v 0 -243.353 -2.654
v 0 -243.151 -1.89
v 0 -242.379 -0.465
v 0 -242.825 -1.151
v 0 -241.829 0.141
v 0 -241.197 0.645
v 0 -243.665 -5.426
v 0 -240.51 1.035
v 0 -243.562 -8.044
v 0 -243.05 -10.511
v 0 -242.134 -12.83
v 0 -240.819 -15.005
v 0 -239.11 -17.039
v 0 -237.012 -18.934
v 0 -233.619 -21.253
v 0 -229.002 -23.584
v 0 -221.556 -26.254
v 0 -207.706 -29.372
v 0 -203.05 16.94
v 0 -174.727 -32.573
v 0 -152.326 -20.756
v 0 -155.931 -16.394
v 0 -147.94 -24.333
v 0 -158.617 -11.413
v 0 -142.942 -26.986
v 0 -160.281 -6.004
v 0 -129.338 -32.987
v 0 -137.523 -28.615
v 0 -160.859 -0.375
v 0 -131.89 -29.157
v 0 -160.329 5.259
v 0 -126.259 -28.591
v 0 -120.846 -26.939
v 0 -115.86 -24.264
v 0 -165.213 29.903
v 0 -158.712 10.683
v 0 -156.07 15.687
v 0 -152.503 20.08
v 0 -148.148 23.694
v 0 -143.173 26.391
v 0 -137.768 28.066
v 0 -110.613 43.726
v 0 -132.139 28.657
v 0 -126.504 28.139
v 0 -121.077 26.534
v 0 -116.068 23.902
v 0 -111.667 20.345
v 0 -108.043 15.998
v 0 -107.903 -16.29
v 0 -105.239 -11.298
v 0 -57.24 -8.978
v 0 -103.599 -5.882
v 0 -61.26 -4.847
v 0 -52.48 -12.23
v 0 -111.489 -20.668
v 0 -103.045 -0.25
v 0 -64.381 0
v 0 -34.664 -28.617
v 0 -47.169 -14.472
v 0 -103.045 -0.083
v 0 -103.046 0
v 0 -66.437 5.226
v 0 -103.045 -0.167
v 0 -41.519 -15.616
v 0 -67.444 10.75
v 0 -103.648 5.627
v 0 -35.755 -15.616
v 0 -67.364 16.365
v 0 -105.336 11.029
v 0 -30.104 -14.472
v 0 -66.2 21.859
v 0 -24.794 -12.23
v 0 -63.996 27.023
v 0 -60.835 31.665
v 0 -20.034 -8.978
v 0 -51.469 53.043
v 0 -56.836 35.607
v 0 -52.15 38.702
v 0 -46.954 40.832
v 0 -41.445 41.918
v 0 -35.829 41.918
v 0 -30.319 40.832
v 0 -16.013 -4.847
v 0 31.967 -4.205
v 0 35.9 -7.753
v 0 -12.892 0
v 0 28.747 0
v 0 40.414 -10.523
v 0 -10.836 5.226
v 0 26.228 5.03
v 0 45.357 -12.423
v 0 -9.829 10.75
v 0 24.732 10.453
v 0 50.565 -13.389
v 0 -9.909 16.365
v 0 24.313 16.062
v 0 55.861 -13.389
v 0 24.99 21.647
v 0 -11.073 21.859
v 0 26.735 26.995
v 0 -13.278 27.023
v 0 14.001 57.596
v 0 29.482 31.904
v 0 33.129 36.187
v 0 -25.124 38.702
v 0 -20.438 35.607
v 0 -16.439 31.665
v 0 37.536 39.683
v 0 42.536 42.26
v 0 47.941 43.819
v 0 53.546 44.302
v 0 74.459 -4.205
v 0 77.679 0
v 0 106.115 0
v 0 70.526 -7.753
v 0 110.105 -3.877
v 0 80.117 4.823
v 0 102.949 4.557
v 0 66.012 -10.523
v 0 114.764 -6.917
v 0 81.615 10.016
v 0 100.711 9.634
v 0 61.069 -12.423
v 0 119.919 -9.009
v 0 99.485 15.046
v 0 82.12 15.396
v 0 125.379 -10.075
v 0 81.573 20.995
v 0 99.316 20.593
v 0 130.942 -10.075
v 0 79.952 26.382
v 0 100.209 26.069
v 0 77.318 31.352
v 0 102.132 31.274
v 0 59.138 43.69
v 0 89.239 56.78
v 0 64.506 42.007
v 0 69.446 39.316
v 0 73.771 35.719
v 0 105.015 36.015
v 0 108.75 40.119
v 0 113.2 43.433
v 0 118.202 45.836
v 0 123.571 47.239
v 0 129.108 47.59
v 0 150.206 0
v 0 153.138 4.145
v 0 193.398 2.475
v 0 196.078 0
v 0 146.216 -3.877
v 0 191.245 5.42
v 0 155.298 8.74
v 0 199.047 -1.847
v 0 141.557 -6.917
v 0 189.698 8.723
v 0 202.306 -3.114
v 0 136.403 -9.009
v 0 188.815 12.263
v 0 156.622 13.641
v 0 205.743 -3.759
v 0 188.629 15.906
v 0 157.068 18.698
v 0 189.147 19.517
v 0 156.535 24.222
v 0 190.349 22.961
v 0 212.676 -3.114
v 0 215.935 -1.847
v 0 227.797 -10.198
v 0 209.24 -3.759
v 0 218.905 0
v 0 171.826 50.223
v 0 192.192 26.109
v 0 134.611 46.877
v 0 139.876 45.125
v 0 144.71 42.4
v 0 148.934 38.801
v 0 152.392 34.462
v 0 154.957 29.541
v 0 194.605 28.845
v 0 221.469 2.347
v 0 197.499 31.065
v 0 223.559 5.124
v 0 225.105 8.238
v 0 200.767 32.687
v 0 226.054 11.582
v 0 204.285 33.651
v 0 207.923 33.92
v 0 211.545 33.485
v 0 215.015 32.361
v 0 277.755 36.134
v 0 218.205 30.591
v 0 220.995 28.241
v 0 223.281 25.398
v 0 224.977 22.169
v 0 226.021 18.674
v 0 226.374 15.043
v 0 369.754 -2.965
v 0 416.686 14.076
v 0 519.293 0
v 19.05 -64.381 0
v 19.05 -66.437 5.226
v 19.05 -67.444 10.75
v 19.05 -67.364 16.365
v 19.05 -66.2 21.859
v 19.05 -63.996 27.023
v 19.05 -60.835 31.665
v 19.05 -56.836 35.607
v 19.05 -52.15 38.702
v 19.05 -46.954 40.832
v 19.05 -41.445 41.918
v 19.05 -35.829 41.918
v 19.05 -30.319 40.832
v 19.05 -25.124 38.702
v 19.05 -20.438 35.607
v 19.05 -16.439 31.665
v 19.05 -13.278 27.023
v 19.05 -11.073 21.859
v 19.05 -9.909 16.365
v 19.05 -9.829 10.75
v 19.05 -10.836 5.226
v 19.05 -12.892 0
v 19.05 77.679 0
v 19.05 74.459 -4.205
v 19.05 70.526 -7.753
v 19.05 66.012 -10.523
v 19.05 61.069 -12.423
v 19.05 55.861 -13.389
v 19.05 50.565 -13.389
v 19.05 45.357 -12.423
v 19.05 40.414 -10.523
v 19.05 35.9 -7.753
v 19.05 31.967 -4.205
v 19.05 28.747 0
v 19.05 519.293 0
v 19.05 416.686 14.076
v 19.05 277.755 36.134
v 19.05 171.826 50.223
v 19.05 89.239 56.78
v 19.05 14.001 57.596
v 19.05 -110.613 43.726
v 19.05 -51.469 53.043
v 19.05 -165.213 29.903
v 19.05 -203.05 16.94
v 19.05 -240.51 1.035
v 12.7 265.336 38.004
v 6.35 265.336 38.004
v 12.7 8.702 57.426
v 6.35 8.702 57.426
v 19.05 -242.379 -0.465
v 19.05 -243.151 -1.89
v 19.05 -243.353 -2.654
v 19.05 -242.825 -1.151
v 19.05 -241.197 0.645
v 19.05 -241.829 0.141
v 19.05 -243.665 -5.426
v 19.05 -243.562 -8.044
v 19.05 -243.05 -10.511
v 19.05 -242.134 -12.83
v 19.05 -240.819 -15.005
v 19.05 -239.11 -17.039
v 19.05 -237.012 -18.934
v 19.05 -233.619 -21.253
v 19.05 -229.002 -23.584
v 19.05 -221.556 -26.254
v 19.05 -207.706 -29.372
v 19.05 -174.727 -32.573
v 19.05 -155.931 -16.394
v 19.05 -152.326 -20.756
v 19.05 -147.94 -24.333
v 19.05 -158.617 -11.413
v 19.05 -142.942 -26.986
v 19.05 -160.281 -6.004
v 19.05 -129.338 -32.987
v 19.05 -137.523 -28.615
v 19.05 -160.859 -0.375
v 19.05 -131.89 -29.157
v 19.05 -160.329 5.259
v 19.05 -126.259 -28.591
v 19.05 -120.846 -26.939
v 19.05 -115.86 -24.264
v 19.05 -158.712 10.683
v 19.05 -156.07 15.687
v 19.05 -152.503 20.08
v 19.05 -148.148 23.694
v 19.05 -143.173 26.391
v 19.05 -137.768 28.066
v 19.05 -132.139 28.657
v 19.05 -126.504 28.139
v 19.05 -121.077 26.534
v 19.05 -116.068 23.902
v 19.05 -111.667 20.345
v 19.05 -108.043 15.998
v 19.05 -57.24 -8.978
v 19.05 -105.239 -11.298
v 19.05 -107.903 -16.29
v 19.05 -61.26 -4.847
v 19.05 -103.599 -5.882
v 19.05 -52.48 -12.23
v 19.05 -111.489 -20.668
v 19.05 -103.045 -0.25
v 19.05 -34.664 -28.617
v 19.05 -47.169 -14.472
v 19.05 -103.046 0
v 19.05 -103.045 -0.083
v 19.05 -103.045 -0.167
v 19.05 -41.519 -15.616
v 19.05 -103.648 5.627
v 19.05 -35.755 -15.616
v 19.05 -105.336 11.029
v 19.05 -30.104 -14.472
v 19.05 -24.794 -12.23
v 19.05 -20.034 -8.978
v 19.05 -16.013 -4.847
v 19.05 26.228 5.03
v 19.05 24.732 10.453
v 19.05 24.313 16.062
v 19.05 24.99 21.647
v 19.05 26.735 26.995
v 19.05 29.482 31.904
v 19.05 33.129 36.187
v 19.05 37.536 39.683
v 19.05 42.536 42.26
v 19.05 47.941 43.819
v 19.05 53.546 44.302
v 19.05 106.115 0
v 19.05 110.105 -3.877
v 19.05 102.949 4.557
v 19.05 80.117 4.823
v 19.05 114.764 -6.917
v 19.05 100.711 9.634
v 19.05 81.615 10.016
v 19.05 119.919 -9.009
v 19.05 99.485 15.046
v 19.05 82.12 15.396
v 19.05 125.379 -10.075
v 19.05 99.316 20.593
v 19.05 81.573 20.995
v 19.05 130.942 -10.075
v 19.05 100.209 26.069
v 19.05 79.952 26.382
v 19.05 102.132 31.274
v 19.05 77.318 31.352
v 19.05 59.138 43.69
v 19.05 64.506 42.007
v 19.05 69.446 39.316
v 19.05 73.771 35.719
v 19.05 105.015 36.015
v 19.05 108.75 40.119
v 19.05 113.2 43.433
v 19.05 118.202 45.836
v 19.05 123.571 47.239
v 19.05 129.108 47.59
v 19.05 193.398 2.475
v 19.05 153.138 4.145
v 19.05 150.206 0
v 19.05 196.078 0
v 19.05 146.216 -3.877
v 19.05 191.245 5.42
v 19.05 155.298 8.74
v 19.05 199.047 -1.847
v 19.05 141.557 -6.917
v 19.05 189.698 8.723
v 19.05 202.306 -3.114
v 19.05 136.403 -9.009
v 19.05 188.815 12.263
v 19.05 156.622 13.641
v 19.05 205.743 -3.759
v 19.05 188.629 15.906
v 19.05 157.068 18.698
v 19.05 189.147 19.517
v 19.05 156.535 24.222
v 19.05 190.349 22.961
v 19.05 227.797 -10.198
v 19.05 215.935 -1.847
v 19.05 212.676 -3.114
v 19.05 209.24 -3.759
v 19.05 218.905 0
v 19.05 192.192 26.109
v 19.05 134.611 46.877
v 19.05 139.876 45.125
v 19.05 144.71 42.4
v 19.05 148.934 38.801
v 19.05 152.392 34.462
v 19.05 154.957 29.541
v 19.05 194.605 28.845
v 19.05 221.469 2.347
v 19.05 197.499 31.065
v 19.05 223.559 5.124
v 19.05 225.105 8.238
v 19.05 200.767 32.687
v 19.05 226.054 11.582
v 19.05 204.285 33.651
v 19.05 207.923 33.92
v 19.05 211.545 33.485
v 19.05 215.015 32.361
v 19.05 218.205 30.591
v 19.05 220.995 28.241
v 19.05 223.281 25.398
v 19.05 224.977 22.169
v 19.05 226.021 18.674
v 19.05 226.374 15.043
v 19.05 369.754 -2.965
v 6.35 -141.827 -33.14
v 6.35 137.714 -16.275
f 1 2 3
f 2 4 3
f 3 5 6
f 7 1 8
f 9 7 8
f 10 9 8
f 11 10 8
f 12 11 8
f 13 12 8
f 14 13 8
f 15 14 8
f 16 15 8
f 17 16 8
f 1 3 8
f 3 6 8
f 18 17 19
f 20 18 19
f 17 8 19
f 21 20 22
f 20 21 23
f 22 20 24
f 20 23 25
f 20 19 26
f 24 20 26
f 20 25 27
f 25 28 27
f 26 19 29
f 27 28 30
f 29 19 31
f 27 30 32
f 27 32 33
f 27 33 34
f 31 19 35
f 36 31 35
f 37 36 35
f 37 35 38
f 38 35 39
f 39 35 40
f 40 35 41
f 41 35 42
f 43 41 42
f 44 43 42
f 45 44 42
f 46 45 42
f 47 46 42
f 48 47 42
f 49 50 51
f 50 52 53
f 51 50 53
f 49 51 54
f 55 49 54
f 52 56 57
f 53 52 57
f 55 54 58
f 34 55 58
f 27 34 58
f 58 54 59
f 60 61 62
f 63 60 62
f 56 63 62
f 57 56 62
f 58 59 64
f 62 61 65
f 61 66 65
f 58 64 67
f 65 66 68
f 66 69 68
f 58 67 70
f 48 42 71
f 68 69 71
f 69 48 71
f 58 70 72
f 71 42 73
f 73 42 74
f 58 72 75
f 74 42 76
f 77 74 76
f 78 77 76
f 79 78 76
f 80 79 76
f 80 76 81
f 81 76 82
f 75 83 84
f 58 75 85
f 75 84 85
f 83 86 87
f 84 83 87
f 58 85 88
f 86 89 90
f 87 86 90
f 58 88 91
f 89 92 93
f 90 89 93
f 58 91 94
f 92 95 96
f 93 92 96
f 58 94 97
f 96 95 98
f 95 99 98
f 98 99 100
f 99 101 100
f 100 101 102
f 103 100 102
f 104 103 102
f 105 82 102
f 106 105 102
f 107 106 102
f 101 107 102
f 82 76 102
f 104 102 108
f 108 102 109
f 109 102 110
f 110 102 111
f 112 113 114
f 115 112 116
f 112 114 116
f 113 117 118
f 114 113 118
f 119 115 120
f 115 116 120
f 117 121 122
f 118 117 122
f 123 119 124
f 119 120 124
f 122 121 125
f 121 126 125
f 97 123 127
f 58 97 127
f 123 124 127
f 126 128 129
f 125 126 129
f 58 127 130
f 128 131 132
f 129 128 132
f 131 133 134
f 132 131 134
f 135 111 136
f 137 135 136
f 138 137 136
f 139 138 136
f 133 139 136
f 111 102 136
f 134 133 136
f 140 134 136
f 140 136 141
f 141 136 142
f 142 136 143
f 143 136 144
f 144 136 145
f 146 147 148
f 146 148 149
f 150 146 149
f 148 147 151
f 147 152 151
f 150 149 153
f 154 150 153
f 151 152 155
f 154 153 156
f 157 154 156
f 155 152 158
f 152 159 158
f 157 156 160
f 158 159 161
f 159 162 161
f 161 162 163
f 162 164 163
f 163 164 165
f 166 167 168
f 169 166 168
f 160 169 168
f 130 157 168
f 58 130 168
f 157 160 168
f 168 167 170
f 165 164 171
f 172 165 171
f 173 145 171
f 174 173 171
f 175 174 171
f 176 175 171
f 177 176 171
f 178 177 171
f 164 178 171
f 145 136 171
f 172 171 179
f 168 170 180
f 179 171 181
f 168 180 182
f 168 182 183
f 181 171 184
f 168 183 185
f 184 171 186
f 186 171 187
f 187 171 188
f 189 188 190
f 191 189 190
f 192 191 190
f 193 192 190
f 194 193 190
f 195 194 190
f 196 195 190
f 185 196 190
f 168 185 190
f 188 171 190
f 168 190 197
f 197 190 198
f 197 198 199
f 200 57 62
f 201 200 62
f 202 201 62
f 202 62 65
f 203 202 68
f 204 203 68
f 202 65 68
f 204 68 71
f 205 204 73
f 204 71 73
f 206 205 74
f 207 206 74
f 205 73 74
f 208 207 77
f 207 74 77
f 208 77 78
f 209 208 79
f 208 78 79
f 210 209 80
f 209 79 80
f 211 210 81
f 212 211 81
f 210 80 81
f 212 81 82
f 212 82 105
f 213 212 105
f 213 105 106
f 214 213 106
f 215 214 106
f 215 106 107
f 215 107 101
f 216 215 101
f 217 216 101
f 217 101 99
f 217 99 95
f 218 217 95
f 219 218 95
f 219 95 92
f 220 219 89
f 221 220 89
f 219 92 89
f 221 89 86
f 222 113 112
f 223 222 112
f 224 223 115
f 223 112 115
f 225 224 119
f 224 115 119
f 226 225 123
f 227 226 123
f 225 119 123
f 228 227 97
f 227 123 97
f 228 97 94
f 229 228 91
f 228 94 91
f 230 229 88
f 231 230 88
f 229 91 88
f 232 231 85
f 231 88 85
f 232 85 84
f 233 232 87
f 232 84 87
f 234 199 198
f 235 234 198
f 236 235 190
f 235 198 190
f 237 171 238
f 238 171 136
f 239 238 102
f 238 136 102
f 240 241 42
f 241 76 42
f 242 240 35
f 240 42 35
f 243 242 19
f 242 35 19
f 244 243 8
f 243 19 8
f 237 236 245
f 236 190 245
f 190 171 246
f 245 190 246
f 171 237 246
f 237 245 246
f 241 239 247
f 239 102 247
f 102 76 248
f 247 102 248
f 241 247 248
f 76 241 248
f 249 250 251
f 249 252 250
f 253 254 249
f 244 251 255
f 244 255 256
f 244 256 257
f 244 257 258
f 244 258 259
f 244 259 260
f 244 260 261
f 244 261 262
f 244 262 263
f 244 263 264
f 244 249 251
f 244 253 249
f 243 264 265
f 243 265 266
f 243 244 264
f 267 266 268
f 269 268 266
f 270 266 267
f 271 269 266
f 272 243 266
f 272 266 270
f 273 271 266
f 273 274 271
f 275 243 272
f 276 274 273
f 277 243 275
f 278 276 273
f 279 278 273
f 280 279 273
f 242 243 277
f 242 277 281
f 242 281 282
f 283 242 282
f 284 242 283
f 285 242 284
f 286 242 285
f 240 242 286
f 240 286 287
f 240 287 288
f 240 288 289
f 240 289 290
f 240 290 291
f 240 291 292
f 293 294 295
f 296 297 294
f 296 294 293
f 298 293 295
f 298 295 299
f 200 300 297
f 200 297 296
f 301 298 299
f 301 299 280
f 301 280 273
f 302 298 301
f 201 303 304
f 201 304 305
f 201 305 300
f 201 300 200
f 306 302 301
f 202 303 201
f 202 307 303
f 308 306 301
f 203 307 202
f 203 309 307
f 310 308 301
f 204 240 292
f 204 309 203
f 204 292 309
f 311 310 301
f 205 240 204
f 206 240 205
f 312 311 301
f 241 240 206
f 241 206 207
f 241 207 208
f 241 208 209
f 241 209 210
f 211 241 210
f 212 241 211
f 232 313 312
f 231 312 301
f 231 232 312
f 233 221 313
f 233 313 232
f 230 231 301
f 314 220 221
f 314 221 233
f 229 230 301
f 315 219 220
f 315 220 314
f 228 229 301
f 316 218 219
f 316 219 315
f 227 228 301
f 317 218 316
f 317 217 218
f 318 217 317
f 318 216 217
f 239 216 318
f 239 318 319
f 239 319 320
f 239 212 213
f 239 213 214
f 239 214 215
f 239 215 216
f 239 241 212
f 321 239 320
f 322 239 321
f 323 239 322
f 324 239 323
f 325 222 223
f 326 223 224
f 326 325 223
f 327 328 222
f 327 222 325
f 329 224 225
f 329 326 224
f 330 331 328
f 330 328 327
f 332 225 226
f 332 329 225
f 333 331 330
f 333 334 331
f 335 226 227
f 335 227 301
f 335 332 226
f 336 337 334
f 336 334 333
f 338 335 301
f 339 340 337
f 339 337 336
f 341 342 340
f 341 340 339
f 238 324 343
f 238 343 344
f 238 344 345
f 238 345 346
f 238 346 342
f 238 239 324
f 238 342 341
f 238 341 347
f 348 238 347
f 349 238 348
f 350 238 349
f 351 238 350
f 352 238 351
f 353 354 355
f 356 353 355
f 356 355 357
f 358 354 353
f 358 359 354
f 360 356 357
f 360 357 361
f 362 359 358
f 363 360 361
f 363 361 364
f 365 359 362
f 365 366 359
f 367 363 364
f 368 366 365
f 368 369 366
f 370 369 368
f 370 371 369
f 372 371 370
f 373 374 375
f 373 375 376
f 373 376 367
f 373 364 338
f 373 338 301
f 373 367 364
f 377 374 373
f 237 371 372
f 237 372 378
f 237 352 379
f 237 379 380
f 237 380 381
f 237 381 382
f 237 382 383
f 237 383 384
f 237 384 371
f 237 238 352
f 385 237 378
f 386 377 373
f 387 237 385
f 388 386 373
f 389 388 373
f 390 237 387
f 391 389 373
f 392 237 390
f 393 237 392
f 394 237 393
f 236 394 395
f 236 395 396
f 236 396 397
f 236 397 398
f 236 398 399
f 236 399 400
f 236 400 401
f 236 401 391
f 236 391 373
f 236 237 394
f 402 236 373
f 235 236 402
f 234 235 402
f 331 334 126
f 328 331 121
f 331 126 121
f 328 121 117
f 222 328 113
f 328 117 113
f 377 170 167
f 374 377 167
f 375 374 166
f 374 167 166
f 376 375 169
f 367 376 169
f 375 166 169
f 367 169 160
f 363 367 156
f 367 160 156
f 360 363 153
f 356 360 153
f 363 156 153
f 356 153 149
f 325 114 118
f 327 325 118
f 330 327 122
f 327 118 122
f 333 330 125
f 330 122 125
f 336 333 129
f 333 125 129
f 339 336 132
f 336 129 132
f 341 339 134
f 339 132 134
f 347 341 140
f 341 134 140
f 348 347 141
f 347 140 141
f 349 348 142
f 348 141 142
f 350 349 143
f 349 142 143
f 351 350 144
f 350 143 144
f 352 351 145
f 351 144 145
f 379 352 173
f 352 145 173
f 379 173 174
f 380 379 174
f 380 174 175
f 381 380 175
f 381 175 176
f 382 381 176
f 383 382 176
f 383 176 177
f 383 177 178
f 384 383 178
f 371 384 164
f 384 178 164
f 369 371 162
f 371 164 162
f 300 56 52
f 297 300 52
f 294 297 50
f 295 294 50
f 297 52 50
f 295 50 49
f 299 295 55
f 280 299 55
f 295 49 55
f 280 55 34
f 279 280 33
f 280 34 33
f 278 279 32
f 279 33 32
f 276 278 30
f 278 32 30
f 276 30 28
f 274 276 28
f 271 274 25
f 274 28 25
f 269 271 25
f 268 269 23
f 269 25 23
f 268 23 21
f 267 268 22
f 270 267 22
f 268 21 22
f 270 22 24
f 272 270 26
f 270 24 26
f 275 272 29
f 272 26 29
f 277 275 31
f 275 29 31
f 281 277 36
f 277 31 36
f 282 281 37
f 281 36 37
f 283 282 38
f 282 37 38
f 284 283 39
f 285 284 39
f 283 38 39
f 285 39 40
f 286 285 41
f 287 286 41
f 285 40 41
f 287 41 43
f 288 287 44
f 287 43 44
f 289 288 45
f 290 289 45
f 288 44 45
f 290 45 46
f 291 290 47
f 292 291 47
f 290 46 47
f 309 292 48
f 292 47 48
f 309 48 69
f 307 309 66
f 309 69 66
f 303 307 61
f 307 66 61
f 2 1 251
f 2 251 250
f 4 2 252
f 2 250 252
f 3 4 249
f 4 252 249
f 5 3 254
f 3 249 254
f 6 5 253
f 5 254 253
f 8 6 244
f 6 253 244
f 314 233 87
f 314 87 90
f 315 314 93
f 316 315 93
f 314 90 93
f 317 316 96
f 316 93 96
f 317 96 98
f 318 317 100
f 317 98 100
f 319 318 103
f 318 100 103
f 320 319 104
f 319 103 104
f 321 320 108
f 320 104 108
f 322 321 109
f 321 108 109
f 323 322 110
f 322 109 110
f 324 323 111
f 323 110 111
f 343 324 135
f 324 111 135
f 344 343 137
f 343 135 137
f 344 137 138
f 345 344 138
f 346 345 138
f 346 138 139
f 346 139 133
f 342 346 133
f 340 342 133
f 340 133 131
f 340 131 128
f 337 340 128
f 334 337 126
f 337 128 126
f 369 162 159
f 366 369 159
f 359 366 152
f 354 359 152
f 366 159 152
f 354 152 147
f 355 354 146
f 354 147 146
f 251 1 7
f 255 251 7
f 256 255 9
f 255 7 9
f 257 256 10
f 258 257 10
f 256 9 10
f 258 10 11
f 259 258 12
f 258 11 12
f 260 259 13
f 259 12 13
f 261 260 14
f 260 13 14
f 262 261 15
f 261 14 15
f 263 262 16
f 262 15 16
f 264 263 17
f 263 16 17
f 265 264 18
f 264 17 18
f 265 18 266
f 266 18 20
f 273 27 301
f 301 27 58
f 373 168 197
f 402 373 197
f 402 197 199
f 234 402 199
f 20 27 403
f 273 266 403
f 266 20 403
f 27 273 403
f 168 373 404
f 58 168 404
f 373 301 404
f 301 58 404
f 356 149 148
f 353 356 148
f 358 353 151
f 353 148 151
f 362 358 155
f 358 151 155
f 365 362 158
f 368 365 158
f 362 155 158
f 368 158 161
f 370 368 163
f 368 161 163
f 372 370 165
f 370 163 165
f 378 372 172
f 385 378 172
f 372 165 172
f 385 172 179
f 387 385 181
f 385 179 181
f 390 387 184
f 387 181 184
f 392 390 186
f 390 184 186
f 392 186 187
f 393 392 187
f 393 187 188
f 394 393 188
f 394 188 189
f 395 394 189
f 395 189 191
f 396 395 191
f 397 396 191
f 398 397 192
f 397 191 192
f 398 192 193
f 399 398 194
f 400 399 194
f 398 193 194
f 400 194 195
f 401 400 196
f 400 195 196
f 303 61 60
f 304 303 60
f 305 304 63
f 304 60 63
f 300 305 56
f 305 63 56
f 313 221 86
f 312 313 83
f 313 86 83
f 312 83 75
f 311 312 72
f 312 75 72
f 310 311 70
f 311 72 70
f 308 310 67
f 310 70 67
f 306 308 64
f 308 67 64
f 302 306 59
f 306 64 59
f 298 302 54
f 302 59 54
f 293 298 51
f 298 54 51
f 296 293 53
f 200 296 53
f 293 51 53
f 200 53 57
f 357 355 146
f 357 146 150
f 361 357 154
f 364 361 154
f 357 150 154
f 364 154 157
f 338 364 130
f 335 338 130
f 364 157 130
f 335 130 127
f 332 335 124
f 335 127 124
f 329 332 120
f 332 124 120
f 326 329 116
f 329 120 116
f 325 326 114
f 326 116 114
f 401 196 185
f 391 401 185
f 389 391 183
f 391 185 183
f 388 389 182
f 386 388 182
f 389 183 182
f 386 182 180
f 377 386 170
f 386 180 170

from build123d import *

# Parameters (mm, degrees)
F1_DEPTH = 19.05
F2_R     = 5.08


with BuildPart() as f1:
    # F0 (on Right) → F1 (new body)
    with BuildSketch(Plane.YZ):
        with BuildLine():
            Line((-160.8581324715, 0), (-242.7069797365, 0))
            add(Edge.make_bspline(
                [(-242.7069797365, 0), (-265.2118802071, -74.5986700058), (107.0116907358, 0), (519.2930202635, 0)],
                knots=[0, 0, 0, 0, 762, 762, 762, 762], degree=3))
            Line((519.2930202635, 0), (218.9046558231, 0))
            ThreePointArc((218.9046558231, 0), (207.4913084507, -3.8397523781), (196.0779610783, 0))
            Line((196.0779610783, 0), (150.206251788, 0))
            ThreePointArc((150.206251788, 0), (128.160789609, -10.2089434816), (106.1153274299, 0))
            Line((106.1153274299, 0), (77.678939592, 0))
            ThreePointArc((77.678939592, 0), (53.2129891217, -13.5109411506), (28.7470386513, 0))
            Line((28.7470386513, 0), (-12.8924874617, 0))
            ThreePointArc((-12.8924874617, 0), (-38.6368222535, -15.7596921502), (-64.3811570453, 0))
            Line((-64.3811570453, 0), (-103.0457951603, 0))
            ThreePointArc((-103.0457951603, 0), (-103.0449853734, -0.1249209702), (-103.0447154427, -0.2498442734))
            ThreePointArc((-103.0447154427, -0.2498442734), (-132.0768871191, -29.1568227159), (-160.8581324715, 0))
        make_face()
        with BuildLine():
            add(Edge.make_bspline(
                [(519.2930202635, 0), (269.2858278751, 28.3039230853), (0, 114.9312928319), (-242.7069797365, 0)],
                knots=[0, 0, 0, 0, 762, 762, 762, 762], degree=3))
            Line((-242.7069797365, 0), (-160.8581324715, 0))
            ThreePointArc((-160.8581324715, 0), (-131.9519638159, 28.6574040998), (-103.0457951603, 0))
            Line((-103.0457951603, 0), (-64.3811570453, 0))
            ThreePointArc((-64.3811570453, 0), (-45.3981508389, 41.2529550685), (-9.7295738803, 13.147556223))
            ThreePointArc((-9.7295738803, 13.147556223), (-10.5314234079, 6.3862276376), (-12.8924874617, 0))
            Line((-12.8924874617, 0), (28.7470386513, 0))
            ThreePointArc((28.7470386513, 0), (45.2009450137, 43.1710467842), (82.1202374948, 15.3963072225))
            ThreePointArc((82.1202374948, 15.3963072225), (80.9877286834, 7.3842631146), (77.678939592, 0))
            Line((77.678939592, 0), (106.1153274299, 0))
            ThreePointArc((106.1153274299, 0), (118.2019905399, 45.8359416643), (157.0680379821, 18.6983048916))
            ThreePointArc((157.0680379821, 18.6983048916), (155.2984263817, 8.7395058225), (150.206251788, 0))
            Line((150.206251788, 0), (196.0779610783, 0))
            ThreePointArc((196.0779610783, 0), (199.0938059623, 31.9551771791), (226.3738016805, 15.0427408516))
            ThreePointArc((226.3738016805, 15.0427408516), (224.4037447781, 6.6452383633), (218.9046558231, 0))
            Line((218.9046558231, 0), (519.2930202635, 0))
        make_face()
    extrude(amount=F1_DEPTH)

    # F2
    f2_edges = [f1.edges().sort_by_distance(p)[0] for p in [
        (9.525, -242.70698, 0),
    ]]
    fillet(f2_edges, radius=F2_R)


solid = f1.part
